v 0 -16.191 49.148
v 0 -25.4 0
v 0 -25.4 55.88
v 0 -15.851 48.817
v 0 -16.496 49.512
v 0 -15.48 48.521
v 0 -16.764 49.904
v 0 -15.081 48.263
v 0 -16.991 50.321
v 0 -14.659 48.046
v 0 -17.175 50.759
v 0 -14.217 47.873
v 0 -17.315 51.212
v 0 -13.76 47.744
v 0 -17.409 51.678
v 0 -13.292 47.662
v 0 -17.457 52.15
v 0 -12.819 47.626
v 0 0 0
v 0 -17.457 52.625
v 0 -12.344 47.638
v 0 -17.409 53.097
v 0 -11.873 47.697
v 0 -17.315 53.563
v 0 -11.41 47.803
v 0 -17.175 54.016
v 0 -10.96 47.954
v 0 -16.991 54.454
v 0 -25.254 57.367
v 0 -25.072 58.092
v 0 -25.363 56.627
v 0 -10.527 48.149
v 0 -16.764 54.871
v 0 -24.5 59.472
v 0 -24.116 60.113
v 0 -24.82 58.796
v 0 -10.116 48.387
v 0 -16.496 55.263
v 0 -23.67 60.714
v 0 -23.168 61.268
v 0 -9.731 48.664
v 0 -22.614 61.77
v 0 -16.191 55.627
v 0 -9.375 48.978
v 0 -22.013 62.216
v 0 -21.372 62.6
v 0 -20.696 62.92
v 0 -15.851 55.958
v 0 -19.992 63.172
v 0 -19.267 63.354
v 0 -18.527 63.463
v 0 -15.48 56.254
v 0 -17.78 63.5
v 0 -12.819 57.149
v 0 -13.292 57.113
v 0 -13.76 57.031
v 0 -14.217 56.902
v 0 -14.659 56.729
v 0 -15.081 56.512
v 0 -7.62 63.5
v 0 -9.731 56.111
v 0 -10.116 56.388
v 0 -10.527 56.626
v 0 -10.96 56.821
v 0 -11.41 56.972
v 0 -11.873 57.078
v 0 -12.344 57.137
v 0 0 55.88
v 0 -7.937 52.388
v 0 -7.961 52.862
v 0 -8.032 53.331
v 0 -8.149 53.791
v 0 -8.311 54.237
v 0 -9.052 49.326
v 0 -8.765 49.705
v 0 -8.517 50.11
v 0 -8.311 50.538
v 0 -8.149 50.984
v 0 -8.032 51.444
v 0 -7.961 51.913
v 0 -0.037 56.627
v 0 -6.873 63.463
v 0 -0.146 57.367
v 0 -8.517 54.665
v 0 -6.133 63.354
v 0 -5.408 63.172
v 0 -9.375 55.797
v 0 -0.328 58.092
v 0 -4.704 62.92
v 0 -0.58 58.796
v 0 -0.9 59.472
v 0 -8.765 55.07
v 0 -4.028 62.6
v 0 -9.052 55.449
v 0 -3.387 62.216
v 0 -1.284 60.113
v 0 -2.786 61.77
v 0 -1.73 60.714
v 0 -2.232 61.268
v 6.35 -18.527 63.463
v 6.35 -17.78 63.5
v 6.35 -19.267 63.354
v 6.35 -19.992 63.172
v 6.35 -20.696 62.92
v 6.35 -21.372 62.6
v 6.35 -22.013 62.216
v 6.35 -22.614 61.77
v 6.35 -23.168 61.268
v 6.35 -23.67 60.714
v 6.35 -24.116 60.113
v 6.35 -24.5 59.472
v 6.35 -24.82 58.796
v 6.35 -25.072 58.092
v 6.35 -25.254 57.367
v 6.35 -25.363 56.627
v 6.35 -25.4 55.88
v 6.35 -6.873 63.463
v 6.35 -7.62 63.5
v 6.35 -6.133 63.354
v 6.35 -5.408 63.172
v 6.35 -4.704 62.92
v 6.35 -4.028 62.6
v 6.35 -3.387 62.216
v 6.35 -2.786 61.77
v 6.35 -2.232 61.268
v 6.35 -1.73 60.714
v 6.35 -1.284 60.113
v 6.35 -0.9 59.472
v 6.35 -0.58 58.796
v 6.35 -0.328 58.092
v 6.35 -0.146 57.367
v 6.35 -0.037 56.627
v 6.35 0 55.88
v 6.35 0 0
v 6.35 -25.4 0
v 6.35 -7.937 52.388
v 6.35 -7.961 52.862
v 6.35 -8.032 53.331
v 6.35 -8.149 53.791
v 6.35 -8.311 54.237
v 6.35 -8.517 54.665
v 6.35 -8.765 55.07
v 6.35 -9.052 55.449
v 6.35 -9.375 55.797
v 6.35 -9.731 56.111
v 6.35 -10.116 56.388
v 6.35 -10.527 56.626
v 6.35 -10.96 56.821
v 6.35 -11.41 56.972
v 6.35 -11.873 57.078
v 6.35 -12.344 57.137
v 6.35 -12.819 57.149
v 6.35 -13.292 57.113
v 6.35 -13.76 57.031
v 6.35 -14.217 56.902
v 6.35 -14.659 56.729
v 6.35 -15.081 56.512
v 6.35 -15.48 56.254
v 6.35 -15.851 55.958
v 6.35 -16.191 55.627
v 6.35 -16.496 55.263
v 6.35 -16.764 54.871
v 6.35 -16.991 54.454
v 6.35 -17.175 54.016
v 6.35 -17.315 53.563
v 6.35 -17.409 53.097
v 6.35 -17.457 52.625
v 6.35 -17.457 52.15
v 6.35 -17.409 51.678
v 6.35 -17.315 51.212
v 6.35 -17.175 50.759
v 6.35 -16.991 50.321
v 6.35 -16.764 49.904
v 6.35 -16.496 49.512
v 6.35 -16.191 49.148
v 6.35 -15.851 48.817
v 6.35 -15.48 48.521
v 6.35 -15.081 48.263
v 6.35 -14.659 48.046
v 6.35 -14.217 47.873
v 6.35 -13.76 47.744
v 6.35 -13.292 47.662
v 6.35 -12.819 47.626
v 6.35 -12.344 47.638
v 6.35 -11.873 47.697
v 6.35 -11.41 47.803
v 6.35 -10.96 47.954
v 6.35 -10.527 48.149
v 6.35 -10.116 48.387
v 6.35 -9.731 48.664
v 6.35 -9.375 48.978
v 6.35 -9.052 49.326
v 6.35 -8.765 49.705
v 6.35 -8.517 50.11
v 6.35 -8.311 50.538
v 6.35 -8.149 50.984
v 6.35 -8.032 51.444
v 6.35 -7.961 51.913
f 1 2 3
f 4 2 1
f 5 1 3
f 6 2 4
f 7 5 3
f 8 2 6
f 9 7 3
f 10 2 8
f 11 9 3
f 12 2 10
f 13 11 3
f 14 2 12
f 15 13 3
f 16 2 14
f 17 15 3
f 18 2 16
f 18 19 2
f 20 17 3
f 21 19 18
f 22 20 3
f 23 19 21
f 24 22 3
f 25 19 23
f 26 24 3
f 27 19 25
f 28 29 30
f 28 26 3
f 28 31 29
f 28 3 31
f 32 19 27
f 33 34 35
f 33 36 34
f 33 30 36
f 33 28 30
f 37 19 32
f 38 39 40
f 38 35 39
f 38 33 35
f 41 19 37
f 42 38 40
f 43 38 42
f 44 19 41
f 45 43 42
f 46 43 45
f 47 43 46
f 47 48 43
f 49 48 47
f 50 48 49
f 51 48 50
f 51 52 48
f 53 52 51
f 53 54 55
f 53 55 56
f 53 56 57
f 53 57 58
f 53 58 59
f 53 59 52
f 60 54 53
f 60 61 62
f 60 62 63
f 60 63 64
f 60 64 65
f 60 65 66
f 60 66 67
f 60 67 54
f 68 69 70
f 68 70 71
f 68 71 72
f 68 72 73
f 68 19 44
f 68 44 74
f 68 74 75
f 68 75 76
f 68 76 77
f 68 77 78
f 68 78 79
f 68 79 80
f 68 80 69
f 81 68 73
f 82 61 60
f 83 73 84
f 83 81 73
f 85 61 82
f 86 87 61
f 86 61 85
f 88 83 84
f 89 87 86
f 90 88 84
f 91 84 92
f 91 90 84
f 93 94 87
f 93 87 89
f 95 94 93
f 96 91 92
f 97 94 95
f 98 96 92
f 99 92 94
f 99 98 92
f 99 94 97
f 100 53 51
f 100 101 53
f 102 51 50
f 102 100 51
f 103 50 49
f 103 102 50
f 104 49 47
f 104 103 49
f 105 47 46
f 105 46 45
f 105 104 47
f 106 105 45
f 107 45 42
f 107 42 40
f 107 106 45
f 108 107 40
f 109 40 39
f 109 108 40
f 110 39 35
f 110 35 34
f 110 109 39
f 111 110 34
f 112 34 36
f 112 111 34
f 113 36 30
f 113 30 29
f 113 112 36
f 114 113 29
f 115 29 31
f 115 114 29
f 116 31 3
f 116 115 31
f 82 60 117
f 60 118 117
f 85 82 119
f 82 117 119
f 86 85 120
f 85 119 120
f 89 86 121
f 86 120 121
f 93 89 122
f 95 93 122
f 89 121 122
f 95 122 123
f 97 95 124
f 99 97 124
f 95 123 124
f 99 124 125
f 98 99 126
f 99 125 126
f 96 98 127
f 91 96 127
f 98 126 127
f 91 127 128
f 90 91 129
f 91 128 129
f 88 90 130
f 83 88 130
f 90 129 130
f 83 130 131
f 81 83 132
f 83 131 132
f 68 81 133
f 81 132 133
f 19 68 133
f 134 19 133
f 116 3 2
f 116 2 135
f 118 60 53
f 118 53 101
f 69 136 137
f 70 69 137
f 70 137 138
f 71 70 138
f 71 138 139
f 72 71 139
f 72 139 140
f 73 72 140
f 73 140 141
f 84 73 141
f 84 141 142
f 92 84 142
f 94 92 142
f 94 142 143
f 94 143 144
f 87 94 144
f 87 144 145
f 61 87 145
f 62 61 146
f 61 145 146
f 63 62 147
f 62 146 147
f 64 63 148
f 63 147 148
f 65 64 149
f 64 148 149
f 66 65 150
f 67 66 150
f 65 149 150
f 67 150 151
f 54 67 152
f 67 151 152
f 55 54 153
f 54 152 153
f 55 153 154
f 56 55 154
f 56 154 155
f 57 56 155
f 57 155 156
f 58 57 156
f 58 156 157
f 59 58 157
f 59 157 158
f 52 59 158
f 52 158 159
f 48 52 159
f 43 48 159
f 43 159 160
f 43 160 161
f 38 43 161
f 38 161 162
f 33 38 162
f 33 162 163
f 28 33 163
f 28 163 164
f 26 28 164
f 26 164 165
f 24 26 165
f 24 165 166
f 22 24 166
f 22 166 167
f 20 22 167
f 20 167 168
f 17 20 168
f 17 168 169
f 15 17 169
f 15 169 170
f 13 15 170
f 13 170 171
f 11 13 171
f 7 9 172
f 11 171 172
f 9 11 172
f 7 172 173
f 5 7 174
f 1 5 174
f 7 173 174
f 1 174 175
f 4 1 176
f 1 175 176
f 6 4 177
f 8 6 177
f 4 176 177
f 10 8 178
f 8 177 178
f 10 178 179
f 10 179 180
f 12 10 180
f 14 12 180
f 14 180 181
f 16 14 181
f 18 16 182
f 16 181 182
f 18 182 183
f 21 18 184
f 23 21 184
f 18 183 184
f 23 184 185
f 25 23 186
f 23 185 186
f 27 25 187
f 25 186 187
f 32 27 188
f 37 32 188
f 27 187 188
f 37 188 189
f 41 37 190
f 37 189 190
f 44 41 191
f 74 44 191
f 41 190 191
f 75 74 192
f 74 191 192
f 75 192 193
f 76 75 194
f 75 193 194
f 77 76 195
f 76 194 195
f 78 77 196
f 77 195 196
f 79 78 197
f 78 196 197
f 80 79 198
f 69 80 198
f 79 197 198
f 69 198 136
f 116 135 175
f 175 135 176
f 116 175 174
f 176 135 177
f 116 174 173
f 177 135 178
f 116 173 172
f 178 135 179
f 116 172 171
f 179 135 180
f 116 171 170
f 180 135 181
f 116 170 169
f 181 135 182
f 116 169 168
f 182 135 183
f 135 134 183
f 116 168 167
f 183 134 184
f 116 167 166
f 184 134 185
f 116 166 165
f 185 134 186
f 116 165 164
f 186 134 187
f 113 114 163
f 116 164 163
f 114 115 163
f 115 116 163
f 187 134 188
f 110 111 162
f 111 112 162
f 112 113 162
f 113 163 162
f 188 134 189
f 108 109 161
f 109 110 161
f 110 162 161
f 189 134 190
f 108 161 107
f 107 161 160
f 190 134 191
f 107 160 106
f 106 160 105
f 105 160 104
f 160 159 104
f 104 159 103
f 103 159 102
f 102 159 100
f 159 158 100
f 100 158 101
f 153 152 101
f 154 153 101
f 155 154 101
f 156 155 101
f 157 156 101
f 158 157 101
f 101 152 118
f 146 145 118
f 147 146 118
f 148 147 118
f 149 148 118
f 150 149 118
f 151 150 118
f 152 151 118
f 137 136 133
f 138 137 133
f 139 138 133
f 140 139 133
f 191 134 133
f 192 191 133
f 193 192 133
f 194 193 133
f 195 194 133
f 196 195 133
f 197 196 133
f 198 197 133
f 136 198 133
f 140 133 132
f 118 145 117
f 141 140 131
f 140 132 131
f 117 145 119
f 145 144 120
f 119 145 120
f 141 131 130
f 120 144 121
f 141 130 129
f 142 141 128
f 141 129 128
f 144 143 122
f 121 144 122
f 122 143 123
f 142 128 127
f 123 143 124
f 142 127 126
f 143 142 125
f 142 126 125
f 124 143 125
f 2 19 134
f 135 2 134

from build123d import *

# Parameters (mm, degrees)
F0_W     = 6.35
F0_H     = 63.5
F1_DEPTH = 25.4
F2_R     = 7.62
F3_R     = 4.7625
F4_DEPTH = 25.4


with BuildPart() as f1:
    # F0 (on Front) → F1 (new body)
    with BuildSketch(Plane.XZ):
        with Locations((3.175, 31.75)):
            Rectangle(F0_W, F0_H)
    extrude(amount=F1_DEPTH)

    # F2
    f2_edges = [f1.edges().sort_by_distance(p)[0] for p in [
        (3.175, -25.4, 63.5),
        (3.175, 0, 63.5),
    ]]
    fillet(f2_edges, radius=F2_R)

    # F3 (on face) → F4 (cut)
    with BuildSketch(Plane.YZ.offset(6.35)):
        with Locations((-12.7, 52.3875)):
            Circle(F3_R)
    extrude(amount=-F4_DEPTH, mode=Mode.SUBTRACT)


solid = f1.part
